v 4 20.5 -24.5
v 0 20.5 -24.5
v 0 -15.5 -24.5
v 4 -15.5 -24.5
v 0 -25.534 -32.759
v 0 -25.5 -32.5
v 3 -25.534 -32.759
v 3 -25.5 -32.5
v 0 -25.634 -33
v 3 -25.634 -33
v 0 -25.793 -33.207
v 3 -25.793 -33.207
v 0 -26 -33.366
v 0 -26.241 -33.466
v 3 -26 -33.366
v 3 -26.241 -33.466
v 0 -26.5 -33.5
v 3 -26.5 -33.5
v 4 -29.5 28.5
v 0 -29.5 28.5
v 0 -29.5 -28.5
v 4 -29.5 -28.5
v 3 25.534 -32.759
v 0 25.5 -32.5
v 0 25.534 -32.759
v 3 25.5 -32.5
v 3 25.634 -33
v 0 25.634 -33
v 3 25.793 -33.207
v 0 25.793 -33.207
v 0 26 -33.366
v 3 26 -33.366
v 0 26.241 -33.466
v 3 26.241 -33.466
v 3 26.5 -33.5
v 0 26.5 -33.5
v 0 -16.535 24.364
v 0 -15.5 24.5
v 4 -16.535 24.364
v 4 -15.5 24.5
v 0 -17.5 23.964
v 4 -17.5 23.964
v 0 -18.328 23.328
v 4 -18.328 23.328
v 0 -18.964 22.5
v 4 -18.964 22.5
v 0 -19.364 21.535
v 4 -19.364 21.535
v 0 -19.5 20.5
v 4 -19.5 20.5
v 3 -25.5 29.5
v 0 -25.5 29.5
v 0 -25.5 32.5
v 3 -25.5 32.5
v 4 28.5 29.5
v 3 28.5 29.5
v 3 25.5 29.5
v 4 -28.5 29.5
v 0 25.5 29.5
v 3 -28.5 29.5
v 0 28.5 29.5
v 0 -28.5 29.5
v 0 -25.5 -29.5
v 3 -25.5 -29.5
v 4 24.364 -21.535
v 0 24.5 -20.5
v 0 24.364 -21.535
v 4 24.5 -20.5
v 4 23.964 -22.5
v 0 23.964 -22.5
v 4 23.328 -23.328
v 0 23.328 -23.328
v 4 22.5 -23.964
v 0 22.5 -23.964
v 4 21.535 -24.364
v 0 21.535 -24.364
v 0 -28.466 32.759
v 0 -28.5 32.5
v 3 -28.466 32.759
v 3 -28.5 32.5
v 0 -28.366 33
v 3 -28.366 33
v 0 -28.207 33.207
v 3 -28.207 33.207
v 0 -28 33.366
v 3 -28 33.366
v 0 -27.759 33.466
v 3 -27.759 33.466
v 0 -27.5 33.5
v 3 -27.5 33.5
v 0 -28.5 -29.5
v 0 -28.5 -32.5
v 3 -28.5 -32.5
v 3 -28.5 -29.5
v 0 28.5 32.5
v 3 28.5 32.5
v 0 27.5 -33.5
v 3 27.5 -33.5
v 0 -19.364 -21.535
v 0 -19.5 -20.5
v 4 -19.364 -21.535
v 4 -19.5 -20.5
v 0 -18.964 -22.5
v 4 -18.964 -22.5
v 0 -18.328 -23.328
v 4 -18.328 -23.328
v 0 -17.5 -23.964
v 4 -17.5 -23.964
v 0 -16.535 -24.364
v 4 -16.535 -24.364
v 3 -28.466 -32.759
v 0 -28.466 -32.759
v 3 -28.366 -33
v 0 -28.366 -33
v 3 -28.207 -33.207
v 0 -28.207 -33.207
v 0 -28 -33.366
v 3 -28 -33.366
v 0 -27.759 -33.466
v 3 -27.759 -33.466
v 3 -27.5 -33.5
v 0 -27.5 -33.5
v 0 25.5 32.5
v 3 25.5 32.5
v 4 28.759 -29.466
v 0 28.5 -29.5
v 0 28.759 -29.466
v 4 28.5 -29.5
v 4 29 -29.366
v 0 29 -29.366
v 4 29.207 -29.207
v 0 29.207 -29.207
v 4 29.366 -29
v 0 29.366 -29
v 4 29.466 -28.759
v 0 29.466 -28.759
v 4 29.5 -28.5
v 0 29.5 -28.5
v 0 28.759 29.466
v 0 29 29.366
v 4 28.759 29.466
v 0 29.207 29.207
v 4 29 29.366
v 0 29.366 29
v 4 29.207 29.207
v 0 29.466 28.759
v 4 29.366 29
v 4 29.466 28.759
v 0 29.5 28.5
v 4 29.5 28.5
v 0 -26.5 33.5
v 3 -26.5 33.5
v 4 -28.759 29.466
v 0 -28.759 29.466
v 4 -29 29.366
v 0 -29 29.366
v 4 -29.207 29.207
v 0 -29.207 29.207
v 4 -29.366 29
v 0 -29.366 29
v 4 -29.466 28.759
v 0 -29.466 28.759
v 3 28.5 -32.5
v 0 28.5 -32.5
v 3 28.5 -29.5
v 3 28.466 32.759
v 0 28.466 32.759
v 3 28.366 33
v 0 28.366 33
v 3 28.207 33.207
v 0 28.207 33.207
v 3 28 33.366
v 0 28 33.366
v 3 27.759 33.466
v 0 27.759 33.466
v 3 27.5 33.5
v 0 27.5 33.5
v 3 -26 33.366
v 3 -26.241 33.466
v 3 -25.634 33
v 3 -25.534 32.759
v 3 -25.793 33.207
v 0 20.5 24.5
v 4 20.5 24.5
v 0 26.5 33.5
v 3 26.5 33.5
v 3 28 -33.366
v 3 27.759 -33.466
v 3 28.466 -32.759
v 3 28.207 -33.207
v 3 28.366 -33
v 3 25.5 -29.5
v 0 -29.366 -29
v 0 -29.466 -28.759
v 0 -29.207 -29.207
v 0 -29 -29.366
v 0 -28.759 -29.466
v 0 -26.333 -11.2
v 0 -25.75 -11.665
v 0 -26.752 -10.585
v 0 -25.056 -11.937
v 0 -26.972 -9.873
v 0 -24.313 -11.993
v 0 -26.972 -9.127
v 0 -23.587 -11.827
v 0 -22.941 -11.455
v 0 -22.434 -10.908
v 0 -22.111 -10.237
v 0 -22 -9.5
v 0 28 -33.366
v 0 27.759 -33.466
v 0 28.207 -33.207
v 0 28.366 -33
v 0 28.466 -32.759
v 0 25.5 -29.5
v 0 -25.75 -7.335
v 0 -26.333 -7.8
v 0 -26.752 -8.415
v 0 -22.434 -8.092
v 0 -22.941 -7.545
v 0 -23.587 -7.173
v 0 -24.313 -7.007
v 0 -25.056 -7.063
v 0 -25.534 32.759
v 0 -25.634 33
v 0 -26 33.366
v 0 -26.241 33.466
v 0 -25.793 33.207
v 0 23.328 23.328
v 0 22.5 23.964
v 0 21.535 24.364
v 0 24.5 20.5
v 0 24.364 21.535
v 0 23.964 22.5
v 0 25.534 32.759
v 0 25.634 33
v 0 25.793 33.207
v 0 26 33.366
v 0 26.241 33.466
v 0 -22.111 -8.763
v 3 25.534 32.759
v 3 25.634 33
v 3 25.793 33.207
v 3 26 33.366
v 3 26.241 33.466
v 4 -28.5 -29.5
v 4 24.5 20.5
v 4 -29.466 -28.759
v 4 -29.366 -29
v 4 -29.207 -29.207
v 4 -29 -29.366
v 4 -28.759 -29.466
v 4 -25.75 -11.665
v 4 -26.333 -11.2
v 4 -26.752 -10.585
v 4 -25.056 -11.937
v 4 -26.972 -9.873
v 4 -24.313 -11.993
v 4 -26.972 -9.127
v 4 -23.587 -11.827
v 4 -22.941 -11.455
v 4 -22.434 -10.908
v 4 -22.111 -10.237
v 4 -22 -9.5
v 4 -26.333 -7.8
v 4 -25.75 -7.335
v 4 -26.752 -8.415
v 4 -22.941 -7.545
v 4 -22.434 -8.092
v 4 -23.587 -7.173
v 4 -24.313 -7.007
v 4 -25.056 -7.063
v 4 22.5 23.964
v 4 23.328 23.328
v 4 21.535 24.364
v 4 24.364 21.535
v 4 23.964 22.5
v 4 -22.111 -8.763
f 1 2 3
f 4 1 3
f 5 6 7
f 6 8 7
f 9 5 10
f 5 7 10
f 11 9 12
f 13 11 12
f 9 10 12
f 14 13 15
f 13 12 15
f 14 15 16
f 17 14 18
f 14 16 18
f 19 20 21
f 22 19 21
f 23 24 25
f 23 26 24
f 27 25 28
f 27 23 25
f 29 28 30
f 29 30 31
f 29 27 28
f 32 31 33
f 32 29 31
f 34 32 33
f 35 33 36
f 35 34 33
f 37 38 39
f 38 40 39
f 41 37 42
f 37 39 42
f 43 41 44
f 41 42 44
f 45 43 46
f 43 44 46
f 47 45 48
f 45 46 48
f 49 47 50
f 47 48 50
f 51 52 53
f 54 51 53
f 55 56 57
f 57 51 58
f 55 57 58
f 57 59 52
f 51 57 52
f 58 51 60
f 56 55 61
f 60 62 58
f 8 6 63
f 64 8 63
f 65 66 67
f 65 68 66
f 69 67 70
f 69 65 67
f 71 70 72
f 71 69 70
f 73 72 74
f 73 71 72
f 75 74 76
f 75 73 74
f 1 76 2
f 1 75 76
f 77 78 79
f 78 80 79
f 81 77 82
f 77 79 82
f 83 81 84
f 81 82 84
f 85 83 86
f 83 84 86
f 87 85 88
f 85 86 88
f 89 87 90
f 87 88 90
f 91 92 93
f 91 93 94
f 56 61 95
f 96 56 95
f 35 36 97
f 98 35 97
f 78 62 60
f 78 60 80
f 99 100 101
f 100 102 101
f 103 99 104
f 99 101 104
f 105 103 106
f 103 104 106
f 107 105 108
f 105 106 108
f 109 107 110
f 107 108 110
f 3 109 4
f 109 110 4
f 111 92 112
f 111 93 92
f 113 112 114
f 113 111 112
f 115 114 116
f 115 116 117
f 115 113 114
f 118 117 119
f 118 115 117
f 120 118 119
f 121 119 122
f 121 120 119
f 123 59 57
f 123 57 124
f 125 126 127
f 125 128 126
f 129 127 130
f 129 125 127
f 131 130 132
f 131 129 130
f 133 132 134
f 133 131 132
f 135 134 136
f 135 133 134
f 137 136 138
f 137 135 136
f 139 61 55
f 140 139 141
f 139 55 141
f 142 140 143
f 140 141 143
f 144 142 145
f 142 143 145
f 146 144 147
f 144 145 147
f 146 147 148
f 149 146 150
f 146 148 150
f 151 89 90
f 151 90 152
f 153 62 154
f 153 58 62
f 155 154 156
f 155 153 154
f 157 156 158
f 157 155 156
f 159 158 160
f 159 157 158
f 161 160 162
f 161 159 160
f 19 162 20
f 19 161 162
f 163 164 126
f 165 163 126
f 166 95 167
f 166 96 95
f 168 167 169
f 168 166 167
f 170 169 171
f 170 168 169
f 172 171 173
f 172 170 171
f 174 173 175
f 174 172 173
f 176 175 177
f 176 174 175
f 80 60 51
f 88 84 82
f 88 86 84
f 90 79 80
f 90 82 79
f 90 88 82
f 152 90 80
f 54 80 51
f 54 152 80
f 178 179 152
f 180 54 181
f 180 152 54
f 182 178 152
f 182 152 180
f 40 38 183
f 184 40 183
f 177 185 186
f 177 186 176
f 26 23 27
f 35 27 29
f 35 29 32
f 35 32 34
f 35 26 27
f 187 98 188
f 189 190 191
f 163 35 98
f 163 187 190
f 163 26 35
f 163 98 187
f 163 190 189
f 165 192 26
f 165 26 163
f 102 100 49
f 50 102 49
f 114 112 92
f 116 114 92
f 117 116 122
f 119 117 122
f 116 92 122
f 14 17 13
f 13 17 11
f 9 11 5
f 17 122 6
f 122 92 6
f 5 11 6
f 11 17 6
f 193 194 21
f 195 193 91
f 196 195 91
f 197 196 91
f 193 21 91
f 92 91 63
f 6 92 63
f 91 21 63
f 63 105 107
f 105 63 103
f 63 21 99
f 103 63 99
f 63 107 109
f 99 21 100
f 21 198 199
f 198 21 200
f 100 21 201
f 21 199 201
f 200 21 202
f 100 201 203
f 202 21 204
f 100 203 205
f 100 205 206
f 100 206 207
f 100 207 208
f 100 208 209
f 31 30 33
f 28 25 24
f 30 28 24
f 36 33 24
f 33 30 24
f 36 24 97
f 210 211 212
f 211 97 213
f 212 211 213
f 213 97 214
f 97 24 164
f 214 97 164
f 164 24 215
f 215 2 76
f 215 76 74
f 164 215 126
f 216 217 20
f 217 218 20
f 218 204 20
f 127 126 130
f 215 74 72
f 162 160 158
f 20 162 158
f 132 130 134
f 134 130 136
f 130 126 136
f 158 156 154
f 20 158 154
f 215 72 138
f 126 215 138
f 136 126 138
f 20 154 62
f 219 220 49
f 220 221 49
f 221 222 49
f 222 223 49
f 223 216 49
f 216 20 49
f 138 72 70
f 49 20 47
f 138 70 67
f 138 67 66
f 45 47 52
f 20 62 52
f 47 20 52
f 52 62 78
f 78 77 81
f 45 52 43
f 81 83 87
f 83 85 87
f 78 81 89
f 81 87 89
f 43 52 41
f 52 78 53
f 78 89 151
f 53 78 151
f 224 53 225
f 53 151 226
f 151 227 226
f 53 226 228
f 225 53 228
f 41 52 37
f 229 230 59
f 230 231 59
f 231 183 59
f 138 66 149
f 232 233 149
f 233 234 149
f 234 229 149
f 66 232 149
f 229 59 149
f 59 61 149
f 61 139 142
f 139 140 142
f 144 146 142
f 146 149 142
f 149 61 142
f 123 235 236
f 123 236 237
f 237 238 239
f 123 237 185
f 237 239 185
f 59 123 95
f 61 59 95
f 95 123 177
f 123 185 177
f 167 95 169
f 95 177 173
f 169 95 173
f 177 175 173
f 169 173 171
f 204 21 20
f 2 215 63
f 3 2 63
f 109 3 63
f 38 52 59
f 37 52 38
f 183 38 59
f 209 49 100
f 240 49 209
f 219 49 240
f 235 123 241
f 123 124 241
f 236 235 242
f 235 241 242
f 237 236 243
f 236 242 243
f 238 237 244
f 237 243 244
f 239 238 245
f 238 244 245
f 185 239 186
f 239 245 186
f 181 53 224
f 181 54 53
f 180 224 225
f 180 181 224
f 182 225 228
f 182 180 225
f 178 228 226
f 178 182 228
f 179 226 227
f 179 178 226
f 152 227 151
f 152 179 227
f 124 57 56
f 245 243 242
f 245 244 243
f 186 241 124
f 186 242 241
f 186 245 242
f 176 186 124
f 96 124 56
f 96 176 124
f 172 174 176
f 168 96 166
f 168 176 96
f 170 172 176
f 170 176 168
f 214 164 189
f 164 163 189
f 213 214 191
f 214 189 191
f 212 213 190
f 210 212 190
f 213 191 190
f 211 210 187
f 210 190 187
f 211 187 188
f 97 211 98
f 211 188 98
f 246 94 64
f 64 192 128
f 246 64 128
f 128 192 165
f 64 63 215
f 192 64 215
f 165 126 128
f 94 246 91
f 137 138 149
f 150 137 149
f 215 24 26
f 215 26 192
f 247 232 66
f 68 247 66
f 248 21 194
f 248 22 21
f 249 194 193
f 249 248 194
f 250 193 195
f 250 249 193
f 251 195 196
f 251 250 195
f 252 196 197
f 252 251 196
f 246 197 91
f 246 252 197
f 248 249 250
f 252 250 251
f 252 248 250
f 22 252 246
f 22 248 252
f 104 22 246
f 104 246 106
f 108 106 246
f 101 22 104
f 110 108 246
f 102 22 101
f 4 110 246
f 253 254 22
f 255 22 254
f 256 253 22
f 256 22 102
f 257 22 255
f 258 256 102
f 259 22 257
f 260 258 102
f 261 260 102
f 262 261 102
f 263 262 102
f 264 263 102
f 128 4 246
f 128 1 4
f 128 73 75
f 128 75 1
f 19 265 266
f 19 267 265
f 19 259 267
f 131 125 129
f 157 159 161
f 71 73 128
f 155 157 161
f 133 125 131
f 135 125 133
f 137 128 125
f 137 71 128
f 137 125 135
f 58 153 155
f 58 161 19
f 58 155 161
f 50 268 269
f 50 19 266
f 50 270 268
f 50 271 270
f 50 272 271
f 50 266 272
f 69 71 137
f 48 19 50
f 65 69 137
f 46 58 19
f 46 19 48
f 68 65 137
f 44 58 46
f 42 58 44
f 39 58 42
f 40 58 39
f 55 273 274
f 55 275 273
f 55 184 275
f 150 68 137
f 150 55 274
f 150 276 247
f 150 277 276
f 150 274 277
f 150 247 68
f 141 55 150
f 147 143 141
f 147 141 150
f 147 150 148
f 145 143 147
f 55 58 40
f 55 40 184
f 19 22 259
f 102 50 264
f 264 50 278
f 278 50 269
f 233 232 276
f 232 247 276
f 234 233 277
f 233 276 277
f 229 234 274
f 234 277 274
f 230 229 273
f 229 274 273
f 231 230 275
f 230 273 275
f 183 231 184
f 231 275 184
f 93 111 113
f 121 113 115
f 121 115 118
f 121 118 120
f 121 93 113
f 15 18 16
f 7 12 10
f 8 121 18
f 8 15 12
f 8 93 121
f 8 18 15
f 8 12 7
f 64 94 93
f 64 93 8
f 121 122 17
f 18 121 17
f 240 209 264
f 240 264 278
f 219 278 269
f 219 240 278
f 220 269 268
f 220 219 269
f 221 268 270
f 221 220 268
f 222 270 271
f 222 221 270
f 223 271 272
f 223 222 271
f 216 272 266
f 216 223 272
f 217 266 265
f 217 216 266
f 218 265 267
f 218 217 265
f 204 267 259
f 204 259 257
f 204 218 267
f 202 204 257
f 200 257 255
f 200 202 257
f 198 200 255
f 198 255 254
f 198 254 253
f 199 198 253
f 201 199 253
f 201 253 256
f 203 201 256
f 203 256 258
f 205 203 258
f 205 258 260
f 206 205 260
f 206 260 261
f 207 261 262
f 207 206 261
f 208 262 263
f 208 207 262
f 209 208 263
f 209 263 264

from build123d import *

# Parameters (mm, degrees)
F0_R     = 2.5
F0_W     = 3
F0_H     = 4
F1_DEPTH = 4
F2_W     = 3
F2_H     = 4
F3_DEPTH = 1
F4_R     = 4
F5_R     = 0.99999


# Not quite as in the source:
# - a fillet or chamfer is up to 0.001 mm smaller than in the source, because OpenCascade refuses the exact size


with BuildPart() as f1:
    # F0 (on Right) → F1 (new body)
    with BuildSketch(Plane.YZ):
        Polygon((-28.5, 29.5), (-29.5, 29.5), (-29.5, -29.5), (-28.5, -29.5), (-25.5, -29.5), (25.5, -29.5), (28.5, -29.5), (29.5, -29.5), (29.5, 29.5), (28.5, 29.5), (25.5, 29.5), (-25.5, 29.5), align=None)
        with Locations((-24.5, -9.5)):
            Circle(F0_R, mode=Mode.SUBTRACT)
        Polygon((19.5, -24.5), (-19.5, -24.5), (-19.5, 24.5), (19.5, 24.5), (24.5, 24.5), (24.5, -24.5), align=None, mode=Mode.SUBTRACT)
        with Locations((-27, 31.5)):
            Rectangle(F0_W, F0_H)
        with Locations((27, 31.5)):
            Rectangle(F0_W, F0_H)
        with Locations((-27, -31.5)):
            Rectangle(F0_W, F0_H)
        with Locations((27, -31.5)):
            Rectangle(F0_W, F0_H)
    extrude(amount=F1_DEPTH)

    # F2 (on face) → F3 (cut)
    with BuildSketch(Plane.YZ.offset(4)):
        with Locations((-27, 31.5)):
            Rectangle(F2_W, F2_H)
        with Locations((27, 31.5)):
            Rectangle(F2_W, F2_H)
        with Locations((-27, -31.5)):
            Rectangle(F2_W, F2_H)
        with Locations((27, -31.5)):
            Rectangle(F2_W, F2_H)
    extrude(amount=-F3_DEPTH, mode=Mode.SUBTRACT)

    # F4
    f4_edges = [f1.edges().sort_by_distance(p)[0] for p in [
        (2, -19.5, 24.5),
        (2, 24.5, 24.5),
        (2, 24.5, -24.5),
        (2, -19.5, -24.5),
    ]]
    fillet(f4_edges, radius=F4_R)

    # F5 (radius 1 in the source; OpenCascade refuses exactly that, so slightly less here)
    f5_edges = [f1.edges().sort_by_distance(p)[0] for p in [
        (1.5, -28.5, 33.5),
        (2, -29.5, 29.5),
        (1.5, -25.5, 33.5),
        (1.5, 25.5, 33.5),
        (1.5, 28.5, 33.5),
        (2, 29.5, 29.5),
        (1.5, -25.5, -33.5),
        (1.5, -28.5, -33.5),
        (2, -29.5, -29.5),
        (1.5, 25.5, -33.5),
        (1.5, 28.5, -33.5),
        (2, 29.5, -29.5),
    ]]
    fillet(f5_edges, radius=F5_R)


solid = f1.part
